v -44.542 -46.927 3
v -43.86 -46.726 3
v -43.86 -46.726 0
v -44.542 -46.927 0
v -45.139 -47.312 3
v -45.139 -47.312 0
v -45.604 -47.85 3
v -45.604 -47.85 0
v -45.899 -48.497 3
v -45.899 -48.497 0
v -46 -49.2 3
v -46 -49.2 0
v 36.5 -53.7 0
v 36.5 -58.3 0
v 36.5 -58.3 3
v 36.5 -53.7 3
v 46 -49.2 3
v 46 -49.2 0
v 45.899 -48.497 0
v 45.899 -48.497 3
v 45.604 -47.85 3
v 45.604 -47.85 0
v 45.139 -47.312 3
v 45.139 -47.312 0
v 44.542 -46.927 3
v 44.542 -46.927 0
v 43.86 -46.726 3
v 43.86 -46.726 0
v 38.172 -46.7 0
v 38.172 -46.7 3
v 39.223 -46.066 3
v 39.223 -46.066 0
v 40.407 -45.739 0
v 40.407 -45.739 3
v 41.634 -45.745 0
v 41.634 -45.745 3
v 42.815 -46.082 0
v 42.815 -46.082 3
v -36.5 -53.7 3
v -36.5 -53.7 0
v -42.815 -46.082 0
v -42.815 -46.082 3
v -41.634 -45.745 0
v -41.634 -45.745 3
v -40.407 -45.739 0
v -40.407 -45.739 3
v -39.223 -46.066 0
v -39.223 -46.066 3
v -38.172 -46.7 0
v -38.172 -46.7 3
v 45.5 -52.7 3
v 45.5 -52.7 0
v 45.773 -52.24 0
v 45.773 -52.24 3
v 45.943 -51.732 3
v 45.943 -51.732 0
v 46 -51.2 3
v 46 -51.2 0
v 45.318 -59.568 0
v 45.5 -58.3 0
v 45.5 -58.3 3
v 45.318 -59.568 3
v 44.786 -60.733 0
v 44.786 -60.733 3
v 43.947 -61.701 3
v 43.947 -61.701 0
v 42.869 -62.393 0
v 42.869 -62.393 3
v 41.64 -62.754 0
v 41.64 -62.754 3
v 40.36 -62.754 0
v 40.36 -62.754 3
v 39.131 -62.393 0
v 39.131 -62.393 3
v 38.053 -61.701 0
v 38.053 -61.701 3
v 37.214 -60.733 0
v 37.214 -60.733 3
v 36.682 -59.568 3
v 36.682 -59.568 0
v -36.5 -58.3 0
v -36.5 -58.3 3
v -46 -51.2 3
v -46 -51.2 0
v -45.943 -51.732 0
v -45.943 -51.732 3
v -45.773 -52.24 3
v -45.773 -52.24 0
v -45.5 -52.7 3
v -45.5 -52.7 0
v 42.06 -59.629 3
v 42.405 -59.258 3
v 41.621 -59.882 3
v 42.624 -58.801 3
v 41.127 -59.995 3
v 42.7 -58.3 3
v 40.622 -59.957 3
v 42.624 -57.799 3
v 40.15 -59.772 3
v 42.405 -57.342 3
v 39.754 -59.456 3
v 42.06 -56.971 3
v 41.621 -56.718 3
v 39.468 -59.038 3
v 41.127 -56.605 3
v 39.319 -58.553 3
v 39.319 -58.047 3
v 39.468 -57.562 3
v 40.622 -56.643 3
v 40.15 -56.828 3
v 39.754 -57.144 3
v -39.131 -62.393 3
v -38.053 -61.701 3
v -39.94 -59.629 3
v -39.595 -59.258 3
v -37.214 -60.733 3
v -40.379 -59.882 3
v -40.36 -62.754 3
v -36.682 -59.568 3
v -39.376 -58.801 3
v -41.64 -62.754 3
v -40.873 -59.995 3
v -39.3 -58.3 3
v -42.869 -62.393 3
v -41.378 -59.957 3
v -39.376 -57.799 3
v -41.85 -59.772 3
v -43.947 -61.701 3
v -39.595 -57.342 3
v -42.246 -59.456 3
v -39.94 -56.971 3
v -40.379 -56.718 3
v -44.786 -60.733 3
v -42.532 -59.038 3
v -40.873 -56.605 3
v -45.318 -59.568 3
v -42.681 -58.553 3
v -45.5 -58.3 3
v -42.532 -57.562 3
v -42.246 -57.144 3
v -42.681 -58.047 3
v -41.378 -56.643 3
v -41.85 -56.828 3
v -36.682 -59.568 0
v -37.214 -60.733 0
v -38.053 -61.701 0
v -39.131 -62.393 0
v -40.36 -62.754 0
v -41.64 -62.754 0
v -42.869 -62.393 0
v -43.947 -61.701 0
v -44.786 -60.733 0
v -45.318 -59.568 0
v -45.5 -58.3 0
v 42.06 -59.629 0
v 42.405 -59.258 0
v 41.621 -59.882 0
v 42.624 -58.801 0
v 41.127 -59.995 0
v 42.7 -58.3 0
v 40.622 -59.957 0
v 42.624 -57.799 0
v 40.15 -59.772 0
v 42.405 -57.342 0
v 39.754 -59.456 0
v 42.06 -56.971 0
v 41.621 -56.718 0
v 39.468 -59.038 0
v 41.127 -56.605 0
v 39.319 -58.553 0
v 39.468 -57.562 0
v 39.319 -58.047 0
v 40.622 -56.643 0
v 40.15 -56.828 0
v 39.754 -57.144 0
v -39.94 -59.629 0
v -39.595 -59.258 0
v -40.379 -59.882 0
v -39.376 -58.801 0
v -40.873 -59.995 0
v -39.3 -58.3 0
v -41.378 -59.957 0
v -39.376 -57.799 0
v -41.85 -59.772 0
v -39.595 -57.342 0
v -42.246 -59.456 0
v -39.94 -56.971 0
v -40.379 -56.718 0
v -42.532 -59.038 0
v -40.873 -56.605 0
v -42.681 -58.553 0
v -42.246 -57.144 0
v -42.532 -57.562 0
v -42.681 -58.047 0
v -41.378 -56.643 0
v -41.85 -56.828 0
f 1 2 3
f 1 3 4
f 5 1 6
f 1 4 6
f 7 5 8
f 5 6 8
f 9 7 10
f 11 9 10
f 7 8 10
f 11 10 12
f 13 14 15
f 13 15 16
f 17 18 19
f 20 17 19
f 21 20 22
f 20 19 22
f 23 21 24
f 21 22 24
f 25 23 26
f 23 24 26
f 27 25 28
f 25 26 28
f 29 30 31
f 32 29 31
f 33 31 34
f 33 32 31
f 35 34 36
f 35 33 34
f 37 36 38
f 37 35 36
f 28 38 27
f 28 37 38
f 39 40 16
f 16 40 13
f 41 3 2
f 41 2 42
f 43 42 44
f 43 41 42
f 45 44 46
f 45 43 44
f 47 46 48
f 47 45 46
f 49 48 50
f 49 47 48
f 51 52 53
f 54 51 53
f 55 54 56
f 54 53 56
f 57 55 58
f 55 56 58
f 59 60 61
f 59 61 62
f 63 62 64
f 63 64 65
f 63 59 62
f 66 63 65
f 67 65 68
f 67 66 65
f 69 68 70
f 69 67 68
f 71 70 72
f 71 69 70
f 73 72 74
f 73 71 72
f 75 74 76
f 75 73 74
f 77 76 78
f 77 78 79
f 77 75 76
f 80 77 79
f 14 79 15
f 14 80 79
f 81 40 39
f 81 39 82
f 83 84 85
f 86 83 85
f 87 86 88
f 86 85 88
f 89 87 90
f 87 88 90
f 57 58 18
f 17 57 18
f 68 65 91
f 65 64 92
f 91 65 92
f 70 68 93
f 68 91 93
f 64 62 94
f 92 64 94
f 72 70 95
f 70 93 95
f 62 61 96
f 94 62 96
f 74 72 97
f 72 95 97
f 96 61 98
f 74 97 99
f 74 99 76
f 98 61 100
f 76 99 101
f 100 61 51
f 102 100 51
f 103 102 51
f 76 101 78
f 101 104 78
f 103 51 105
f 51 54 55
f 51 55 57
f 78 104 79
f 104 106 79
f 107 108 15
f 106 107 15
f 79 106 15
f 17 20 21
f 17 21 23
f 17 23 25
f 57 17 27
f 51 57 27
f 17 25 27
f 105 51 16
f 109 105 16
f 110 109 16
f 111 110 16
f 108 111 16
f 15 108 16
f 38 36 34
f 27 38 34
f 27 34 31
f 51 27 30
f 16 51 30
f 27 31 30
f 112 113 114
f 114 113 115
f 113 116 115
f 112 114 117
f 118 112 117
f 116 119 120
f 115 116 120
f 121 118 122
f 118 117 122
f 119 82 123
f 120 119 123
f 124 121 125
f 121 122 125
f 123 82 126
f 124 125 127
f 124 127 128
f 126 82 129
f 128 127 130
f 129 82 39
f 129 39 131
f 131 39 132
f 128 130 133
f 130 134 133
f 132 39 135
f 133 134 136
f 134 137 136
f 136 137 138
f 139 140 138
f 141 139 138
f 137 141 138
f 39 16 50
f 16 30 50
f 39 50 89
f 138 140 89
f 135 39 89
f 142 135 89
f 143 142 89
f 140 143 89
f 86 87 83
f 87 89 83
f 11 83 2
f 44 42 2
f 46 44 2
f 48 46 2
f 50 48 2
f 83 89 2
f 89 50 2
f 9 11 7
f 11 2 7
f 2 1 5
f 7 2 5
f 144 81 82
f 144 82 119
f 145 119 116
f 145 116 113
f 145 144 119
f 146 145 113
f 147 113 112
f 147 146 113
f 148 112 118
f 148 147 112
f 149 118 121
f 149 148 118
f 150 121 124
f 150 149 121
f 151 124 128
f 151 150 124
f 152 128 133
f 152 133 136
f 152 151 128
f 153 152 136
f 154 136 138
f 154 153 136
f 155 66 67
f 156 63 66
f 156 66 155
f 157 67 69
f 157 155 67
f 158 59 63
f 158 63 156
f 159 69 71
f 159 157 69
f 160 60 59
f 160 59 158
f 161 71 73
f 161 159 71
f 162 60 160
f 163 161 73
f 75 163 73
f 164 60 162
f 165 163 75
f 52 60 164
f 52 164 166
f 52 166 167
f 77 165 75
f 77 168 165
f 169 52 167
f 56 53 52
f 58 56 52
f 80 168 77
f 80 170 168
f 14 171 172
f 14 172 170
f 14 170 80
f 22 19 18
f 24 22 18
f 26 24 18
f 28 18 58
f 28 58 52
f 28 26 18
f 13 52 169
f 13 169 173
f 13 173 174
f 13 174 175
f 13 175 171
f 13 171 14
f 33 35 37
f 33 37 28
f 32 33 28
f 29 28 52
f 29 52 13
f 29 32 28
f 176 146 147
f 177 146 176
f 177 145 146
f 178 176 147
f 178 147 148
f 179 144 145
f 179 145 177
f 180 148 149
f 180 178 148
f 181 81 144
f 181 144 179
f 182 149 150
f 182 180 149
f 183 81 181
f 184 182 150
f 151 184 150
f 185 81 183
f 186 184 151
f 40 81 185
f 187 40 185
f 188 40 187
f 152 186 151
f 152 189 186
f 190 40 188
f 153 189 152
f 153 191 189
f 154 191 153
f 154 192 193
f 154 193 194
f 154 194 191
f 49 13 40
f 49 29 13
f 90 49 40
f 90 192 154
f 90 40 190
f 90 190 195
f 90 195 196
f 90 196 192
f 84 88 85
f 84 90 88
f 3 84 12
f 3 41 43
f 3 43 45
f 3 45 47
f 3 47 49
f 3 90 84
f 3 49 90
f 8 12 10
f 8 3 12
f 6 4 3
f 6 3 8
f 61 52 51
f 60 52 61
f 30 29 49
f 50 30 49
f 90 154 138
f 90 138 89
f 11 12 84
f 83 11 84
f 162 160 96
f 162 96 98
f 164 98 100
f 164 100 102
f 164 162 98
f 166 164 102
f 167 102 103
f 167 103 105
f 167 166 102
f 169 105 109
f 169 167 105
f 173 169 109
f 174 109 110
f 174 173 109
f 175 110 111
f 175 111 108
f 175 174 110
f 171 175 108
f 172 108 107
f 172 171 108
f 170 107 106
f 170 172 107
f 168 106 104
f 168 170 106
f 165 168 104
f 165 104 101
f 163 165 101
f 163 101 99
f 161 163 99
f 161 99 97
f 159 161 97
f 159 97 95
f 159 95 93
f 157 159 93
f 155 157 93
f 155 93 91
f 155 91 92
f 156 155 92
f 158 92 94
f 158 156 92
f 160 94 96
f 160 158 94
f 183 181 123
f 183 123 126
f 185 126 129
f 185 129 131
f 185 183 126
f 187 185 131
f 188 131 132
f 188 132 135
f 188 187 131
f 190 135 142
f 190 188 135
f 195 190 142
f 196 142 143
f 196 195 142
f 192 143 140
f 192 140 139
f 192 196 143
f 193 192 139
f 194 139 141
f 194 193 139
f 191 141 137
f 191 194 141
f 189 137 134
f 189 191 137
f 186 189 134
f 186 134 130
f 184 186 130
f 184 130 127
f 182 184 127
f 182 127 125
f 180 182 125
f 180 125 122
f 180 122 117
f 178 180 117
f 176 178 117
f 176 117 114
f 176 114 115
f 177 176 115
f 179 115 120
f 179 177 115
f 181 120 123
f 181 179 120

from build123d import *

# Parameters (mm, degrees)
F_01_REMOVABLE_UPPER_CROSSBAR_DEPTH = 3
S02_FASTENING_LUG_0_R               = 1.7
F_02_FASTENING_LUG_0_DEPTH          = 3
S03_FASTENING_LUG_1_R               = 1.7
F_03_FASTENING_LUG_1_DEPTH          = 3


with BuildPart() as part:
    # S01 - Removable upper crossbar → 01 - Removable upper crossbar (new body)
    with BuildSketch(Plane.XY):
        with BuildLine():
            Line((-43.5, -53.7), (43.5, -53.7))
            ThreePointArc((43.5, -53.7), (45.267766953, -52.967766953), (46, -51.2))
            Line((46, -51.2), (46, -49.2))
            ThreePointArc((46, -49.2), (45.267766953, -47.432233047), (43.5, -46.7))
            Line((43.5, -46.7), (-43.5, -46.7))
            ThreePointArc((-43.5, -46.7), (-45.267766953, -47.432233047), (-46, -49.2))
            Line((-46, -49.2), (-46, -51.2))
            ThreePointArc((-46, -51.2), (-45.267766953, -52.967766953), (-43.5, -53.7))
        make_face()
    extrude(amount=F_01_REMOVABLE_UPPER_CROSSBAR_DEPTH)

    # S02 - Fastening lug 0 → 02 - Fastening lug 0 (add)
    with BuildSketch(Plane.XY):
        with BuildLine():
            Line((-45.5, -58.3), (-45.5, -50.2))
            ThreePointArc((-45.5, -50.2), (-41, -45.7), (-36.5, -50.2))
            Line((-36.5, -50.2), (-36.5, -58.3))
            ThreePointArc((-36.5, -58.3), (-41, -62.8), (-45.5, -58.3))
        make_face()
        with Locations((-41, -58.3)):
            Circle(S02_FASTENING_LUG_0_R, mode=Mode.SUBTRACT)
    extrude(amount=F_02_FASTENING_LUG_0_DEPTH)

    # S03 - Fastening lug 1 → 03 - Fastening lug 1 (add)
    with BuildSketch(Plane.XY):
        with BuildLine():
            Line((36.5, -58.3), (36.5, -50.2))
            ThreePointArc((36.5, -50.2), (41, -45.7), (45.5, -50.2))
            Line((45.5, -50.2), (45.5, -58.3))
            ThreePointArc((45.5, -58.3), (41, -62.8), (36.5, -58.3))
        make_face()
        with Locations((41, -58.3)):
            Circle(S03_FASTENING_LUG_1_R, mode=Mode.SUBTRACT)
    extrude(amount=F_03_FASTENING_LUG_1_DEPTH)


solid = part.part
